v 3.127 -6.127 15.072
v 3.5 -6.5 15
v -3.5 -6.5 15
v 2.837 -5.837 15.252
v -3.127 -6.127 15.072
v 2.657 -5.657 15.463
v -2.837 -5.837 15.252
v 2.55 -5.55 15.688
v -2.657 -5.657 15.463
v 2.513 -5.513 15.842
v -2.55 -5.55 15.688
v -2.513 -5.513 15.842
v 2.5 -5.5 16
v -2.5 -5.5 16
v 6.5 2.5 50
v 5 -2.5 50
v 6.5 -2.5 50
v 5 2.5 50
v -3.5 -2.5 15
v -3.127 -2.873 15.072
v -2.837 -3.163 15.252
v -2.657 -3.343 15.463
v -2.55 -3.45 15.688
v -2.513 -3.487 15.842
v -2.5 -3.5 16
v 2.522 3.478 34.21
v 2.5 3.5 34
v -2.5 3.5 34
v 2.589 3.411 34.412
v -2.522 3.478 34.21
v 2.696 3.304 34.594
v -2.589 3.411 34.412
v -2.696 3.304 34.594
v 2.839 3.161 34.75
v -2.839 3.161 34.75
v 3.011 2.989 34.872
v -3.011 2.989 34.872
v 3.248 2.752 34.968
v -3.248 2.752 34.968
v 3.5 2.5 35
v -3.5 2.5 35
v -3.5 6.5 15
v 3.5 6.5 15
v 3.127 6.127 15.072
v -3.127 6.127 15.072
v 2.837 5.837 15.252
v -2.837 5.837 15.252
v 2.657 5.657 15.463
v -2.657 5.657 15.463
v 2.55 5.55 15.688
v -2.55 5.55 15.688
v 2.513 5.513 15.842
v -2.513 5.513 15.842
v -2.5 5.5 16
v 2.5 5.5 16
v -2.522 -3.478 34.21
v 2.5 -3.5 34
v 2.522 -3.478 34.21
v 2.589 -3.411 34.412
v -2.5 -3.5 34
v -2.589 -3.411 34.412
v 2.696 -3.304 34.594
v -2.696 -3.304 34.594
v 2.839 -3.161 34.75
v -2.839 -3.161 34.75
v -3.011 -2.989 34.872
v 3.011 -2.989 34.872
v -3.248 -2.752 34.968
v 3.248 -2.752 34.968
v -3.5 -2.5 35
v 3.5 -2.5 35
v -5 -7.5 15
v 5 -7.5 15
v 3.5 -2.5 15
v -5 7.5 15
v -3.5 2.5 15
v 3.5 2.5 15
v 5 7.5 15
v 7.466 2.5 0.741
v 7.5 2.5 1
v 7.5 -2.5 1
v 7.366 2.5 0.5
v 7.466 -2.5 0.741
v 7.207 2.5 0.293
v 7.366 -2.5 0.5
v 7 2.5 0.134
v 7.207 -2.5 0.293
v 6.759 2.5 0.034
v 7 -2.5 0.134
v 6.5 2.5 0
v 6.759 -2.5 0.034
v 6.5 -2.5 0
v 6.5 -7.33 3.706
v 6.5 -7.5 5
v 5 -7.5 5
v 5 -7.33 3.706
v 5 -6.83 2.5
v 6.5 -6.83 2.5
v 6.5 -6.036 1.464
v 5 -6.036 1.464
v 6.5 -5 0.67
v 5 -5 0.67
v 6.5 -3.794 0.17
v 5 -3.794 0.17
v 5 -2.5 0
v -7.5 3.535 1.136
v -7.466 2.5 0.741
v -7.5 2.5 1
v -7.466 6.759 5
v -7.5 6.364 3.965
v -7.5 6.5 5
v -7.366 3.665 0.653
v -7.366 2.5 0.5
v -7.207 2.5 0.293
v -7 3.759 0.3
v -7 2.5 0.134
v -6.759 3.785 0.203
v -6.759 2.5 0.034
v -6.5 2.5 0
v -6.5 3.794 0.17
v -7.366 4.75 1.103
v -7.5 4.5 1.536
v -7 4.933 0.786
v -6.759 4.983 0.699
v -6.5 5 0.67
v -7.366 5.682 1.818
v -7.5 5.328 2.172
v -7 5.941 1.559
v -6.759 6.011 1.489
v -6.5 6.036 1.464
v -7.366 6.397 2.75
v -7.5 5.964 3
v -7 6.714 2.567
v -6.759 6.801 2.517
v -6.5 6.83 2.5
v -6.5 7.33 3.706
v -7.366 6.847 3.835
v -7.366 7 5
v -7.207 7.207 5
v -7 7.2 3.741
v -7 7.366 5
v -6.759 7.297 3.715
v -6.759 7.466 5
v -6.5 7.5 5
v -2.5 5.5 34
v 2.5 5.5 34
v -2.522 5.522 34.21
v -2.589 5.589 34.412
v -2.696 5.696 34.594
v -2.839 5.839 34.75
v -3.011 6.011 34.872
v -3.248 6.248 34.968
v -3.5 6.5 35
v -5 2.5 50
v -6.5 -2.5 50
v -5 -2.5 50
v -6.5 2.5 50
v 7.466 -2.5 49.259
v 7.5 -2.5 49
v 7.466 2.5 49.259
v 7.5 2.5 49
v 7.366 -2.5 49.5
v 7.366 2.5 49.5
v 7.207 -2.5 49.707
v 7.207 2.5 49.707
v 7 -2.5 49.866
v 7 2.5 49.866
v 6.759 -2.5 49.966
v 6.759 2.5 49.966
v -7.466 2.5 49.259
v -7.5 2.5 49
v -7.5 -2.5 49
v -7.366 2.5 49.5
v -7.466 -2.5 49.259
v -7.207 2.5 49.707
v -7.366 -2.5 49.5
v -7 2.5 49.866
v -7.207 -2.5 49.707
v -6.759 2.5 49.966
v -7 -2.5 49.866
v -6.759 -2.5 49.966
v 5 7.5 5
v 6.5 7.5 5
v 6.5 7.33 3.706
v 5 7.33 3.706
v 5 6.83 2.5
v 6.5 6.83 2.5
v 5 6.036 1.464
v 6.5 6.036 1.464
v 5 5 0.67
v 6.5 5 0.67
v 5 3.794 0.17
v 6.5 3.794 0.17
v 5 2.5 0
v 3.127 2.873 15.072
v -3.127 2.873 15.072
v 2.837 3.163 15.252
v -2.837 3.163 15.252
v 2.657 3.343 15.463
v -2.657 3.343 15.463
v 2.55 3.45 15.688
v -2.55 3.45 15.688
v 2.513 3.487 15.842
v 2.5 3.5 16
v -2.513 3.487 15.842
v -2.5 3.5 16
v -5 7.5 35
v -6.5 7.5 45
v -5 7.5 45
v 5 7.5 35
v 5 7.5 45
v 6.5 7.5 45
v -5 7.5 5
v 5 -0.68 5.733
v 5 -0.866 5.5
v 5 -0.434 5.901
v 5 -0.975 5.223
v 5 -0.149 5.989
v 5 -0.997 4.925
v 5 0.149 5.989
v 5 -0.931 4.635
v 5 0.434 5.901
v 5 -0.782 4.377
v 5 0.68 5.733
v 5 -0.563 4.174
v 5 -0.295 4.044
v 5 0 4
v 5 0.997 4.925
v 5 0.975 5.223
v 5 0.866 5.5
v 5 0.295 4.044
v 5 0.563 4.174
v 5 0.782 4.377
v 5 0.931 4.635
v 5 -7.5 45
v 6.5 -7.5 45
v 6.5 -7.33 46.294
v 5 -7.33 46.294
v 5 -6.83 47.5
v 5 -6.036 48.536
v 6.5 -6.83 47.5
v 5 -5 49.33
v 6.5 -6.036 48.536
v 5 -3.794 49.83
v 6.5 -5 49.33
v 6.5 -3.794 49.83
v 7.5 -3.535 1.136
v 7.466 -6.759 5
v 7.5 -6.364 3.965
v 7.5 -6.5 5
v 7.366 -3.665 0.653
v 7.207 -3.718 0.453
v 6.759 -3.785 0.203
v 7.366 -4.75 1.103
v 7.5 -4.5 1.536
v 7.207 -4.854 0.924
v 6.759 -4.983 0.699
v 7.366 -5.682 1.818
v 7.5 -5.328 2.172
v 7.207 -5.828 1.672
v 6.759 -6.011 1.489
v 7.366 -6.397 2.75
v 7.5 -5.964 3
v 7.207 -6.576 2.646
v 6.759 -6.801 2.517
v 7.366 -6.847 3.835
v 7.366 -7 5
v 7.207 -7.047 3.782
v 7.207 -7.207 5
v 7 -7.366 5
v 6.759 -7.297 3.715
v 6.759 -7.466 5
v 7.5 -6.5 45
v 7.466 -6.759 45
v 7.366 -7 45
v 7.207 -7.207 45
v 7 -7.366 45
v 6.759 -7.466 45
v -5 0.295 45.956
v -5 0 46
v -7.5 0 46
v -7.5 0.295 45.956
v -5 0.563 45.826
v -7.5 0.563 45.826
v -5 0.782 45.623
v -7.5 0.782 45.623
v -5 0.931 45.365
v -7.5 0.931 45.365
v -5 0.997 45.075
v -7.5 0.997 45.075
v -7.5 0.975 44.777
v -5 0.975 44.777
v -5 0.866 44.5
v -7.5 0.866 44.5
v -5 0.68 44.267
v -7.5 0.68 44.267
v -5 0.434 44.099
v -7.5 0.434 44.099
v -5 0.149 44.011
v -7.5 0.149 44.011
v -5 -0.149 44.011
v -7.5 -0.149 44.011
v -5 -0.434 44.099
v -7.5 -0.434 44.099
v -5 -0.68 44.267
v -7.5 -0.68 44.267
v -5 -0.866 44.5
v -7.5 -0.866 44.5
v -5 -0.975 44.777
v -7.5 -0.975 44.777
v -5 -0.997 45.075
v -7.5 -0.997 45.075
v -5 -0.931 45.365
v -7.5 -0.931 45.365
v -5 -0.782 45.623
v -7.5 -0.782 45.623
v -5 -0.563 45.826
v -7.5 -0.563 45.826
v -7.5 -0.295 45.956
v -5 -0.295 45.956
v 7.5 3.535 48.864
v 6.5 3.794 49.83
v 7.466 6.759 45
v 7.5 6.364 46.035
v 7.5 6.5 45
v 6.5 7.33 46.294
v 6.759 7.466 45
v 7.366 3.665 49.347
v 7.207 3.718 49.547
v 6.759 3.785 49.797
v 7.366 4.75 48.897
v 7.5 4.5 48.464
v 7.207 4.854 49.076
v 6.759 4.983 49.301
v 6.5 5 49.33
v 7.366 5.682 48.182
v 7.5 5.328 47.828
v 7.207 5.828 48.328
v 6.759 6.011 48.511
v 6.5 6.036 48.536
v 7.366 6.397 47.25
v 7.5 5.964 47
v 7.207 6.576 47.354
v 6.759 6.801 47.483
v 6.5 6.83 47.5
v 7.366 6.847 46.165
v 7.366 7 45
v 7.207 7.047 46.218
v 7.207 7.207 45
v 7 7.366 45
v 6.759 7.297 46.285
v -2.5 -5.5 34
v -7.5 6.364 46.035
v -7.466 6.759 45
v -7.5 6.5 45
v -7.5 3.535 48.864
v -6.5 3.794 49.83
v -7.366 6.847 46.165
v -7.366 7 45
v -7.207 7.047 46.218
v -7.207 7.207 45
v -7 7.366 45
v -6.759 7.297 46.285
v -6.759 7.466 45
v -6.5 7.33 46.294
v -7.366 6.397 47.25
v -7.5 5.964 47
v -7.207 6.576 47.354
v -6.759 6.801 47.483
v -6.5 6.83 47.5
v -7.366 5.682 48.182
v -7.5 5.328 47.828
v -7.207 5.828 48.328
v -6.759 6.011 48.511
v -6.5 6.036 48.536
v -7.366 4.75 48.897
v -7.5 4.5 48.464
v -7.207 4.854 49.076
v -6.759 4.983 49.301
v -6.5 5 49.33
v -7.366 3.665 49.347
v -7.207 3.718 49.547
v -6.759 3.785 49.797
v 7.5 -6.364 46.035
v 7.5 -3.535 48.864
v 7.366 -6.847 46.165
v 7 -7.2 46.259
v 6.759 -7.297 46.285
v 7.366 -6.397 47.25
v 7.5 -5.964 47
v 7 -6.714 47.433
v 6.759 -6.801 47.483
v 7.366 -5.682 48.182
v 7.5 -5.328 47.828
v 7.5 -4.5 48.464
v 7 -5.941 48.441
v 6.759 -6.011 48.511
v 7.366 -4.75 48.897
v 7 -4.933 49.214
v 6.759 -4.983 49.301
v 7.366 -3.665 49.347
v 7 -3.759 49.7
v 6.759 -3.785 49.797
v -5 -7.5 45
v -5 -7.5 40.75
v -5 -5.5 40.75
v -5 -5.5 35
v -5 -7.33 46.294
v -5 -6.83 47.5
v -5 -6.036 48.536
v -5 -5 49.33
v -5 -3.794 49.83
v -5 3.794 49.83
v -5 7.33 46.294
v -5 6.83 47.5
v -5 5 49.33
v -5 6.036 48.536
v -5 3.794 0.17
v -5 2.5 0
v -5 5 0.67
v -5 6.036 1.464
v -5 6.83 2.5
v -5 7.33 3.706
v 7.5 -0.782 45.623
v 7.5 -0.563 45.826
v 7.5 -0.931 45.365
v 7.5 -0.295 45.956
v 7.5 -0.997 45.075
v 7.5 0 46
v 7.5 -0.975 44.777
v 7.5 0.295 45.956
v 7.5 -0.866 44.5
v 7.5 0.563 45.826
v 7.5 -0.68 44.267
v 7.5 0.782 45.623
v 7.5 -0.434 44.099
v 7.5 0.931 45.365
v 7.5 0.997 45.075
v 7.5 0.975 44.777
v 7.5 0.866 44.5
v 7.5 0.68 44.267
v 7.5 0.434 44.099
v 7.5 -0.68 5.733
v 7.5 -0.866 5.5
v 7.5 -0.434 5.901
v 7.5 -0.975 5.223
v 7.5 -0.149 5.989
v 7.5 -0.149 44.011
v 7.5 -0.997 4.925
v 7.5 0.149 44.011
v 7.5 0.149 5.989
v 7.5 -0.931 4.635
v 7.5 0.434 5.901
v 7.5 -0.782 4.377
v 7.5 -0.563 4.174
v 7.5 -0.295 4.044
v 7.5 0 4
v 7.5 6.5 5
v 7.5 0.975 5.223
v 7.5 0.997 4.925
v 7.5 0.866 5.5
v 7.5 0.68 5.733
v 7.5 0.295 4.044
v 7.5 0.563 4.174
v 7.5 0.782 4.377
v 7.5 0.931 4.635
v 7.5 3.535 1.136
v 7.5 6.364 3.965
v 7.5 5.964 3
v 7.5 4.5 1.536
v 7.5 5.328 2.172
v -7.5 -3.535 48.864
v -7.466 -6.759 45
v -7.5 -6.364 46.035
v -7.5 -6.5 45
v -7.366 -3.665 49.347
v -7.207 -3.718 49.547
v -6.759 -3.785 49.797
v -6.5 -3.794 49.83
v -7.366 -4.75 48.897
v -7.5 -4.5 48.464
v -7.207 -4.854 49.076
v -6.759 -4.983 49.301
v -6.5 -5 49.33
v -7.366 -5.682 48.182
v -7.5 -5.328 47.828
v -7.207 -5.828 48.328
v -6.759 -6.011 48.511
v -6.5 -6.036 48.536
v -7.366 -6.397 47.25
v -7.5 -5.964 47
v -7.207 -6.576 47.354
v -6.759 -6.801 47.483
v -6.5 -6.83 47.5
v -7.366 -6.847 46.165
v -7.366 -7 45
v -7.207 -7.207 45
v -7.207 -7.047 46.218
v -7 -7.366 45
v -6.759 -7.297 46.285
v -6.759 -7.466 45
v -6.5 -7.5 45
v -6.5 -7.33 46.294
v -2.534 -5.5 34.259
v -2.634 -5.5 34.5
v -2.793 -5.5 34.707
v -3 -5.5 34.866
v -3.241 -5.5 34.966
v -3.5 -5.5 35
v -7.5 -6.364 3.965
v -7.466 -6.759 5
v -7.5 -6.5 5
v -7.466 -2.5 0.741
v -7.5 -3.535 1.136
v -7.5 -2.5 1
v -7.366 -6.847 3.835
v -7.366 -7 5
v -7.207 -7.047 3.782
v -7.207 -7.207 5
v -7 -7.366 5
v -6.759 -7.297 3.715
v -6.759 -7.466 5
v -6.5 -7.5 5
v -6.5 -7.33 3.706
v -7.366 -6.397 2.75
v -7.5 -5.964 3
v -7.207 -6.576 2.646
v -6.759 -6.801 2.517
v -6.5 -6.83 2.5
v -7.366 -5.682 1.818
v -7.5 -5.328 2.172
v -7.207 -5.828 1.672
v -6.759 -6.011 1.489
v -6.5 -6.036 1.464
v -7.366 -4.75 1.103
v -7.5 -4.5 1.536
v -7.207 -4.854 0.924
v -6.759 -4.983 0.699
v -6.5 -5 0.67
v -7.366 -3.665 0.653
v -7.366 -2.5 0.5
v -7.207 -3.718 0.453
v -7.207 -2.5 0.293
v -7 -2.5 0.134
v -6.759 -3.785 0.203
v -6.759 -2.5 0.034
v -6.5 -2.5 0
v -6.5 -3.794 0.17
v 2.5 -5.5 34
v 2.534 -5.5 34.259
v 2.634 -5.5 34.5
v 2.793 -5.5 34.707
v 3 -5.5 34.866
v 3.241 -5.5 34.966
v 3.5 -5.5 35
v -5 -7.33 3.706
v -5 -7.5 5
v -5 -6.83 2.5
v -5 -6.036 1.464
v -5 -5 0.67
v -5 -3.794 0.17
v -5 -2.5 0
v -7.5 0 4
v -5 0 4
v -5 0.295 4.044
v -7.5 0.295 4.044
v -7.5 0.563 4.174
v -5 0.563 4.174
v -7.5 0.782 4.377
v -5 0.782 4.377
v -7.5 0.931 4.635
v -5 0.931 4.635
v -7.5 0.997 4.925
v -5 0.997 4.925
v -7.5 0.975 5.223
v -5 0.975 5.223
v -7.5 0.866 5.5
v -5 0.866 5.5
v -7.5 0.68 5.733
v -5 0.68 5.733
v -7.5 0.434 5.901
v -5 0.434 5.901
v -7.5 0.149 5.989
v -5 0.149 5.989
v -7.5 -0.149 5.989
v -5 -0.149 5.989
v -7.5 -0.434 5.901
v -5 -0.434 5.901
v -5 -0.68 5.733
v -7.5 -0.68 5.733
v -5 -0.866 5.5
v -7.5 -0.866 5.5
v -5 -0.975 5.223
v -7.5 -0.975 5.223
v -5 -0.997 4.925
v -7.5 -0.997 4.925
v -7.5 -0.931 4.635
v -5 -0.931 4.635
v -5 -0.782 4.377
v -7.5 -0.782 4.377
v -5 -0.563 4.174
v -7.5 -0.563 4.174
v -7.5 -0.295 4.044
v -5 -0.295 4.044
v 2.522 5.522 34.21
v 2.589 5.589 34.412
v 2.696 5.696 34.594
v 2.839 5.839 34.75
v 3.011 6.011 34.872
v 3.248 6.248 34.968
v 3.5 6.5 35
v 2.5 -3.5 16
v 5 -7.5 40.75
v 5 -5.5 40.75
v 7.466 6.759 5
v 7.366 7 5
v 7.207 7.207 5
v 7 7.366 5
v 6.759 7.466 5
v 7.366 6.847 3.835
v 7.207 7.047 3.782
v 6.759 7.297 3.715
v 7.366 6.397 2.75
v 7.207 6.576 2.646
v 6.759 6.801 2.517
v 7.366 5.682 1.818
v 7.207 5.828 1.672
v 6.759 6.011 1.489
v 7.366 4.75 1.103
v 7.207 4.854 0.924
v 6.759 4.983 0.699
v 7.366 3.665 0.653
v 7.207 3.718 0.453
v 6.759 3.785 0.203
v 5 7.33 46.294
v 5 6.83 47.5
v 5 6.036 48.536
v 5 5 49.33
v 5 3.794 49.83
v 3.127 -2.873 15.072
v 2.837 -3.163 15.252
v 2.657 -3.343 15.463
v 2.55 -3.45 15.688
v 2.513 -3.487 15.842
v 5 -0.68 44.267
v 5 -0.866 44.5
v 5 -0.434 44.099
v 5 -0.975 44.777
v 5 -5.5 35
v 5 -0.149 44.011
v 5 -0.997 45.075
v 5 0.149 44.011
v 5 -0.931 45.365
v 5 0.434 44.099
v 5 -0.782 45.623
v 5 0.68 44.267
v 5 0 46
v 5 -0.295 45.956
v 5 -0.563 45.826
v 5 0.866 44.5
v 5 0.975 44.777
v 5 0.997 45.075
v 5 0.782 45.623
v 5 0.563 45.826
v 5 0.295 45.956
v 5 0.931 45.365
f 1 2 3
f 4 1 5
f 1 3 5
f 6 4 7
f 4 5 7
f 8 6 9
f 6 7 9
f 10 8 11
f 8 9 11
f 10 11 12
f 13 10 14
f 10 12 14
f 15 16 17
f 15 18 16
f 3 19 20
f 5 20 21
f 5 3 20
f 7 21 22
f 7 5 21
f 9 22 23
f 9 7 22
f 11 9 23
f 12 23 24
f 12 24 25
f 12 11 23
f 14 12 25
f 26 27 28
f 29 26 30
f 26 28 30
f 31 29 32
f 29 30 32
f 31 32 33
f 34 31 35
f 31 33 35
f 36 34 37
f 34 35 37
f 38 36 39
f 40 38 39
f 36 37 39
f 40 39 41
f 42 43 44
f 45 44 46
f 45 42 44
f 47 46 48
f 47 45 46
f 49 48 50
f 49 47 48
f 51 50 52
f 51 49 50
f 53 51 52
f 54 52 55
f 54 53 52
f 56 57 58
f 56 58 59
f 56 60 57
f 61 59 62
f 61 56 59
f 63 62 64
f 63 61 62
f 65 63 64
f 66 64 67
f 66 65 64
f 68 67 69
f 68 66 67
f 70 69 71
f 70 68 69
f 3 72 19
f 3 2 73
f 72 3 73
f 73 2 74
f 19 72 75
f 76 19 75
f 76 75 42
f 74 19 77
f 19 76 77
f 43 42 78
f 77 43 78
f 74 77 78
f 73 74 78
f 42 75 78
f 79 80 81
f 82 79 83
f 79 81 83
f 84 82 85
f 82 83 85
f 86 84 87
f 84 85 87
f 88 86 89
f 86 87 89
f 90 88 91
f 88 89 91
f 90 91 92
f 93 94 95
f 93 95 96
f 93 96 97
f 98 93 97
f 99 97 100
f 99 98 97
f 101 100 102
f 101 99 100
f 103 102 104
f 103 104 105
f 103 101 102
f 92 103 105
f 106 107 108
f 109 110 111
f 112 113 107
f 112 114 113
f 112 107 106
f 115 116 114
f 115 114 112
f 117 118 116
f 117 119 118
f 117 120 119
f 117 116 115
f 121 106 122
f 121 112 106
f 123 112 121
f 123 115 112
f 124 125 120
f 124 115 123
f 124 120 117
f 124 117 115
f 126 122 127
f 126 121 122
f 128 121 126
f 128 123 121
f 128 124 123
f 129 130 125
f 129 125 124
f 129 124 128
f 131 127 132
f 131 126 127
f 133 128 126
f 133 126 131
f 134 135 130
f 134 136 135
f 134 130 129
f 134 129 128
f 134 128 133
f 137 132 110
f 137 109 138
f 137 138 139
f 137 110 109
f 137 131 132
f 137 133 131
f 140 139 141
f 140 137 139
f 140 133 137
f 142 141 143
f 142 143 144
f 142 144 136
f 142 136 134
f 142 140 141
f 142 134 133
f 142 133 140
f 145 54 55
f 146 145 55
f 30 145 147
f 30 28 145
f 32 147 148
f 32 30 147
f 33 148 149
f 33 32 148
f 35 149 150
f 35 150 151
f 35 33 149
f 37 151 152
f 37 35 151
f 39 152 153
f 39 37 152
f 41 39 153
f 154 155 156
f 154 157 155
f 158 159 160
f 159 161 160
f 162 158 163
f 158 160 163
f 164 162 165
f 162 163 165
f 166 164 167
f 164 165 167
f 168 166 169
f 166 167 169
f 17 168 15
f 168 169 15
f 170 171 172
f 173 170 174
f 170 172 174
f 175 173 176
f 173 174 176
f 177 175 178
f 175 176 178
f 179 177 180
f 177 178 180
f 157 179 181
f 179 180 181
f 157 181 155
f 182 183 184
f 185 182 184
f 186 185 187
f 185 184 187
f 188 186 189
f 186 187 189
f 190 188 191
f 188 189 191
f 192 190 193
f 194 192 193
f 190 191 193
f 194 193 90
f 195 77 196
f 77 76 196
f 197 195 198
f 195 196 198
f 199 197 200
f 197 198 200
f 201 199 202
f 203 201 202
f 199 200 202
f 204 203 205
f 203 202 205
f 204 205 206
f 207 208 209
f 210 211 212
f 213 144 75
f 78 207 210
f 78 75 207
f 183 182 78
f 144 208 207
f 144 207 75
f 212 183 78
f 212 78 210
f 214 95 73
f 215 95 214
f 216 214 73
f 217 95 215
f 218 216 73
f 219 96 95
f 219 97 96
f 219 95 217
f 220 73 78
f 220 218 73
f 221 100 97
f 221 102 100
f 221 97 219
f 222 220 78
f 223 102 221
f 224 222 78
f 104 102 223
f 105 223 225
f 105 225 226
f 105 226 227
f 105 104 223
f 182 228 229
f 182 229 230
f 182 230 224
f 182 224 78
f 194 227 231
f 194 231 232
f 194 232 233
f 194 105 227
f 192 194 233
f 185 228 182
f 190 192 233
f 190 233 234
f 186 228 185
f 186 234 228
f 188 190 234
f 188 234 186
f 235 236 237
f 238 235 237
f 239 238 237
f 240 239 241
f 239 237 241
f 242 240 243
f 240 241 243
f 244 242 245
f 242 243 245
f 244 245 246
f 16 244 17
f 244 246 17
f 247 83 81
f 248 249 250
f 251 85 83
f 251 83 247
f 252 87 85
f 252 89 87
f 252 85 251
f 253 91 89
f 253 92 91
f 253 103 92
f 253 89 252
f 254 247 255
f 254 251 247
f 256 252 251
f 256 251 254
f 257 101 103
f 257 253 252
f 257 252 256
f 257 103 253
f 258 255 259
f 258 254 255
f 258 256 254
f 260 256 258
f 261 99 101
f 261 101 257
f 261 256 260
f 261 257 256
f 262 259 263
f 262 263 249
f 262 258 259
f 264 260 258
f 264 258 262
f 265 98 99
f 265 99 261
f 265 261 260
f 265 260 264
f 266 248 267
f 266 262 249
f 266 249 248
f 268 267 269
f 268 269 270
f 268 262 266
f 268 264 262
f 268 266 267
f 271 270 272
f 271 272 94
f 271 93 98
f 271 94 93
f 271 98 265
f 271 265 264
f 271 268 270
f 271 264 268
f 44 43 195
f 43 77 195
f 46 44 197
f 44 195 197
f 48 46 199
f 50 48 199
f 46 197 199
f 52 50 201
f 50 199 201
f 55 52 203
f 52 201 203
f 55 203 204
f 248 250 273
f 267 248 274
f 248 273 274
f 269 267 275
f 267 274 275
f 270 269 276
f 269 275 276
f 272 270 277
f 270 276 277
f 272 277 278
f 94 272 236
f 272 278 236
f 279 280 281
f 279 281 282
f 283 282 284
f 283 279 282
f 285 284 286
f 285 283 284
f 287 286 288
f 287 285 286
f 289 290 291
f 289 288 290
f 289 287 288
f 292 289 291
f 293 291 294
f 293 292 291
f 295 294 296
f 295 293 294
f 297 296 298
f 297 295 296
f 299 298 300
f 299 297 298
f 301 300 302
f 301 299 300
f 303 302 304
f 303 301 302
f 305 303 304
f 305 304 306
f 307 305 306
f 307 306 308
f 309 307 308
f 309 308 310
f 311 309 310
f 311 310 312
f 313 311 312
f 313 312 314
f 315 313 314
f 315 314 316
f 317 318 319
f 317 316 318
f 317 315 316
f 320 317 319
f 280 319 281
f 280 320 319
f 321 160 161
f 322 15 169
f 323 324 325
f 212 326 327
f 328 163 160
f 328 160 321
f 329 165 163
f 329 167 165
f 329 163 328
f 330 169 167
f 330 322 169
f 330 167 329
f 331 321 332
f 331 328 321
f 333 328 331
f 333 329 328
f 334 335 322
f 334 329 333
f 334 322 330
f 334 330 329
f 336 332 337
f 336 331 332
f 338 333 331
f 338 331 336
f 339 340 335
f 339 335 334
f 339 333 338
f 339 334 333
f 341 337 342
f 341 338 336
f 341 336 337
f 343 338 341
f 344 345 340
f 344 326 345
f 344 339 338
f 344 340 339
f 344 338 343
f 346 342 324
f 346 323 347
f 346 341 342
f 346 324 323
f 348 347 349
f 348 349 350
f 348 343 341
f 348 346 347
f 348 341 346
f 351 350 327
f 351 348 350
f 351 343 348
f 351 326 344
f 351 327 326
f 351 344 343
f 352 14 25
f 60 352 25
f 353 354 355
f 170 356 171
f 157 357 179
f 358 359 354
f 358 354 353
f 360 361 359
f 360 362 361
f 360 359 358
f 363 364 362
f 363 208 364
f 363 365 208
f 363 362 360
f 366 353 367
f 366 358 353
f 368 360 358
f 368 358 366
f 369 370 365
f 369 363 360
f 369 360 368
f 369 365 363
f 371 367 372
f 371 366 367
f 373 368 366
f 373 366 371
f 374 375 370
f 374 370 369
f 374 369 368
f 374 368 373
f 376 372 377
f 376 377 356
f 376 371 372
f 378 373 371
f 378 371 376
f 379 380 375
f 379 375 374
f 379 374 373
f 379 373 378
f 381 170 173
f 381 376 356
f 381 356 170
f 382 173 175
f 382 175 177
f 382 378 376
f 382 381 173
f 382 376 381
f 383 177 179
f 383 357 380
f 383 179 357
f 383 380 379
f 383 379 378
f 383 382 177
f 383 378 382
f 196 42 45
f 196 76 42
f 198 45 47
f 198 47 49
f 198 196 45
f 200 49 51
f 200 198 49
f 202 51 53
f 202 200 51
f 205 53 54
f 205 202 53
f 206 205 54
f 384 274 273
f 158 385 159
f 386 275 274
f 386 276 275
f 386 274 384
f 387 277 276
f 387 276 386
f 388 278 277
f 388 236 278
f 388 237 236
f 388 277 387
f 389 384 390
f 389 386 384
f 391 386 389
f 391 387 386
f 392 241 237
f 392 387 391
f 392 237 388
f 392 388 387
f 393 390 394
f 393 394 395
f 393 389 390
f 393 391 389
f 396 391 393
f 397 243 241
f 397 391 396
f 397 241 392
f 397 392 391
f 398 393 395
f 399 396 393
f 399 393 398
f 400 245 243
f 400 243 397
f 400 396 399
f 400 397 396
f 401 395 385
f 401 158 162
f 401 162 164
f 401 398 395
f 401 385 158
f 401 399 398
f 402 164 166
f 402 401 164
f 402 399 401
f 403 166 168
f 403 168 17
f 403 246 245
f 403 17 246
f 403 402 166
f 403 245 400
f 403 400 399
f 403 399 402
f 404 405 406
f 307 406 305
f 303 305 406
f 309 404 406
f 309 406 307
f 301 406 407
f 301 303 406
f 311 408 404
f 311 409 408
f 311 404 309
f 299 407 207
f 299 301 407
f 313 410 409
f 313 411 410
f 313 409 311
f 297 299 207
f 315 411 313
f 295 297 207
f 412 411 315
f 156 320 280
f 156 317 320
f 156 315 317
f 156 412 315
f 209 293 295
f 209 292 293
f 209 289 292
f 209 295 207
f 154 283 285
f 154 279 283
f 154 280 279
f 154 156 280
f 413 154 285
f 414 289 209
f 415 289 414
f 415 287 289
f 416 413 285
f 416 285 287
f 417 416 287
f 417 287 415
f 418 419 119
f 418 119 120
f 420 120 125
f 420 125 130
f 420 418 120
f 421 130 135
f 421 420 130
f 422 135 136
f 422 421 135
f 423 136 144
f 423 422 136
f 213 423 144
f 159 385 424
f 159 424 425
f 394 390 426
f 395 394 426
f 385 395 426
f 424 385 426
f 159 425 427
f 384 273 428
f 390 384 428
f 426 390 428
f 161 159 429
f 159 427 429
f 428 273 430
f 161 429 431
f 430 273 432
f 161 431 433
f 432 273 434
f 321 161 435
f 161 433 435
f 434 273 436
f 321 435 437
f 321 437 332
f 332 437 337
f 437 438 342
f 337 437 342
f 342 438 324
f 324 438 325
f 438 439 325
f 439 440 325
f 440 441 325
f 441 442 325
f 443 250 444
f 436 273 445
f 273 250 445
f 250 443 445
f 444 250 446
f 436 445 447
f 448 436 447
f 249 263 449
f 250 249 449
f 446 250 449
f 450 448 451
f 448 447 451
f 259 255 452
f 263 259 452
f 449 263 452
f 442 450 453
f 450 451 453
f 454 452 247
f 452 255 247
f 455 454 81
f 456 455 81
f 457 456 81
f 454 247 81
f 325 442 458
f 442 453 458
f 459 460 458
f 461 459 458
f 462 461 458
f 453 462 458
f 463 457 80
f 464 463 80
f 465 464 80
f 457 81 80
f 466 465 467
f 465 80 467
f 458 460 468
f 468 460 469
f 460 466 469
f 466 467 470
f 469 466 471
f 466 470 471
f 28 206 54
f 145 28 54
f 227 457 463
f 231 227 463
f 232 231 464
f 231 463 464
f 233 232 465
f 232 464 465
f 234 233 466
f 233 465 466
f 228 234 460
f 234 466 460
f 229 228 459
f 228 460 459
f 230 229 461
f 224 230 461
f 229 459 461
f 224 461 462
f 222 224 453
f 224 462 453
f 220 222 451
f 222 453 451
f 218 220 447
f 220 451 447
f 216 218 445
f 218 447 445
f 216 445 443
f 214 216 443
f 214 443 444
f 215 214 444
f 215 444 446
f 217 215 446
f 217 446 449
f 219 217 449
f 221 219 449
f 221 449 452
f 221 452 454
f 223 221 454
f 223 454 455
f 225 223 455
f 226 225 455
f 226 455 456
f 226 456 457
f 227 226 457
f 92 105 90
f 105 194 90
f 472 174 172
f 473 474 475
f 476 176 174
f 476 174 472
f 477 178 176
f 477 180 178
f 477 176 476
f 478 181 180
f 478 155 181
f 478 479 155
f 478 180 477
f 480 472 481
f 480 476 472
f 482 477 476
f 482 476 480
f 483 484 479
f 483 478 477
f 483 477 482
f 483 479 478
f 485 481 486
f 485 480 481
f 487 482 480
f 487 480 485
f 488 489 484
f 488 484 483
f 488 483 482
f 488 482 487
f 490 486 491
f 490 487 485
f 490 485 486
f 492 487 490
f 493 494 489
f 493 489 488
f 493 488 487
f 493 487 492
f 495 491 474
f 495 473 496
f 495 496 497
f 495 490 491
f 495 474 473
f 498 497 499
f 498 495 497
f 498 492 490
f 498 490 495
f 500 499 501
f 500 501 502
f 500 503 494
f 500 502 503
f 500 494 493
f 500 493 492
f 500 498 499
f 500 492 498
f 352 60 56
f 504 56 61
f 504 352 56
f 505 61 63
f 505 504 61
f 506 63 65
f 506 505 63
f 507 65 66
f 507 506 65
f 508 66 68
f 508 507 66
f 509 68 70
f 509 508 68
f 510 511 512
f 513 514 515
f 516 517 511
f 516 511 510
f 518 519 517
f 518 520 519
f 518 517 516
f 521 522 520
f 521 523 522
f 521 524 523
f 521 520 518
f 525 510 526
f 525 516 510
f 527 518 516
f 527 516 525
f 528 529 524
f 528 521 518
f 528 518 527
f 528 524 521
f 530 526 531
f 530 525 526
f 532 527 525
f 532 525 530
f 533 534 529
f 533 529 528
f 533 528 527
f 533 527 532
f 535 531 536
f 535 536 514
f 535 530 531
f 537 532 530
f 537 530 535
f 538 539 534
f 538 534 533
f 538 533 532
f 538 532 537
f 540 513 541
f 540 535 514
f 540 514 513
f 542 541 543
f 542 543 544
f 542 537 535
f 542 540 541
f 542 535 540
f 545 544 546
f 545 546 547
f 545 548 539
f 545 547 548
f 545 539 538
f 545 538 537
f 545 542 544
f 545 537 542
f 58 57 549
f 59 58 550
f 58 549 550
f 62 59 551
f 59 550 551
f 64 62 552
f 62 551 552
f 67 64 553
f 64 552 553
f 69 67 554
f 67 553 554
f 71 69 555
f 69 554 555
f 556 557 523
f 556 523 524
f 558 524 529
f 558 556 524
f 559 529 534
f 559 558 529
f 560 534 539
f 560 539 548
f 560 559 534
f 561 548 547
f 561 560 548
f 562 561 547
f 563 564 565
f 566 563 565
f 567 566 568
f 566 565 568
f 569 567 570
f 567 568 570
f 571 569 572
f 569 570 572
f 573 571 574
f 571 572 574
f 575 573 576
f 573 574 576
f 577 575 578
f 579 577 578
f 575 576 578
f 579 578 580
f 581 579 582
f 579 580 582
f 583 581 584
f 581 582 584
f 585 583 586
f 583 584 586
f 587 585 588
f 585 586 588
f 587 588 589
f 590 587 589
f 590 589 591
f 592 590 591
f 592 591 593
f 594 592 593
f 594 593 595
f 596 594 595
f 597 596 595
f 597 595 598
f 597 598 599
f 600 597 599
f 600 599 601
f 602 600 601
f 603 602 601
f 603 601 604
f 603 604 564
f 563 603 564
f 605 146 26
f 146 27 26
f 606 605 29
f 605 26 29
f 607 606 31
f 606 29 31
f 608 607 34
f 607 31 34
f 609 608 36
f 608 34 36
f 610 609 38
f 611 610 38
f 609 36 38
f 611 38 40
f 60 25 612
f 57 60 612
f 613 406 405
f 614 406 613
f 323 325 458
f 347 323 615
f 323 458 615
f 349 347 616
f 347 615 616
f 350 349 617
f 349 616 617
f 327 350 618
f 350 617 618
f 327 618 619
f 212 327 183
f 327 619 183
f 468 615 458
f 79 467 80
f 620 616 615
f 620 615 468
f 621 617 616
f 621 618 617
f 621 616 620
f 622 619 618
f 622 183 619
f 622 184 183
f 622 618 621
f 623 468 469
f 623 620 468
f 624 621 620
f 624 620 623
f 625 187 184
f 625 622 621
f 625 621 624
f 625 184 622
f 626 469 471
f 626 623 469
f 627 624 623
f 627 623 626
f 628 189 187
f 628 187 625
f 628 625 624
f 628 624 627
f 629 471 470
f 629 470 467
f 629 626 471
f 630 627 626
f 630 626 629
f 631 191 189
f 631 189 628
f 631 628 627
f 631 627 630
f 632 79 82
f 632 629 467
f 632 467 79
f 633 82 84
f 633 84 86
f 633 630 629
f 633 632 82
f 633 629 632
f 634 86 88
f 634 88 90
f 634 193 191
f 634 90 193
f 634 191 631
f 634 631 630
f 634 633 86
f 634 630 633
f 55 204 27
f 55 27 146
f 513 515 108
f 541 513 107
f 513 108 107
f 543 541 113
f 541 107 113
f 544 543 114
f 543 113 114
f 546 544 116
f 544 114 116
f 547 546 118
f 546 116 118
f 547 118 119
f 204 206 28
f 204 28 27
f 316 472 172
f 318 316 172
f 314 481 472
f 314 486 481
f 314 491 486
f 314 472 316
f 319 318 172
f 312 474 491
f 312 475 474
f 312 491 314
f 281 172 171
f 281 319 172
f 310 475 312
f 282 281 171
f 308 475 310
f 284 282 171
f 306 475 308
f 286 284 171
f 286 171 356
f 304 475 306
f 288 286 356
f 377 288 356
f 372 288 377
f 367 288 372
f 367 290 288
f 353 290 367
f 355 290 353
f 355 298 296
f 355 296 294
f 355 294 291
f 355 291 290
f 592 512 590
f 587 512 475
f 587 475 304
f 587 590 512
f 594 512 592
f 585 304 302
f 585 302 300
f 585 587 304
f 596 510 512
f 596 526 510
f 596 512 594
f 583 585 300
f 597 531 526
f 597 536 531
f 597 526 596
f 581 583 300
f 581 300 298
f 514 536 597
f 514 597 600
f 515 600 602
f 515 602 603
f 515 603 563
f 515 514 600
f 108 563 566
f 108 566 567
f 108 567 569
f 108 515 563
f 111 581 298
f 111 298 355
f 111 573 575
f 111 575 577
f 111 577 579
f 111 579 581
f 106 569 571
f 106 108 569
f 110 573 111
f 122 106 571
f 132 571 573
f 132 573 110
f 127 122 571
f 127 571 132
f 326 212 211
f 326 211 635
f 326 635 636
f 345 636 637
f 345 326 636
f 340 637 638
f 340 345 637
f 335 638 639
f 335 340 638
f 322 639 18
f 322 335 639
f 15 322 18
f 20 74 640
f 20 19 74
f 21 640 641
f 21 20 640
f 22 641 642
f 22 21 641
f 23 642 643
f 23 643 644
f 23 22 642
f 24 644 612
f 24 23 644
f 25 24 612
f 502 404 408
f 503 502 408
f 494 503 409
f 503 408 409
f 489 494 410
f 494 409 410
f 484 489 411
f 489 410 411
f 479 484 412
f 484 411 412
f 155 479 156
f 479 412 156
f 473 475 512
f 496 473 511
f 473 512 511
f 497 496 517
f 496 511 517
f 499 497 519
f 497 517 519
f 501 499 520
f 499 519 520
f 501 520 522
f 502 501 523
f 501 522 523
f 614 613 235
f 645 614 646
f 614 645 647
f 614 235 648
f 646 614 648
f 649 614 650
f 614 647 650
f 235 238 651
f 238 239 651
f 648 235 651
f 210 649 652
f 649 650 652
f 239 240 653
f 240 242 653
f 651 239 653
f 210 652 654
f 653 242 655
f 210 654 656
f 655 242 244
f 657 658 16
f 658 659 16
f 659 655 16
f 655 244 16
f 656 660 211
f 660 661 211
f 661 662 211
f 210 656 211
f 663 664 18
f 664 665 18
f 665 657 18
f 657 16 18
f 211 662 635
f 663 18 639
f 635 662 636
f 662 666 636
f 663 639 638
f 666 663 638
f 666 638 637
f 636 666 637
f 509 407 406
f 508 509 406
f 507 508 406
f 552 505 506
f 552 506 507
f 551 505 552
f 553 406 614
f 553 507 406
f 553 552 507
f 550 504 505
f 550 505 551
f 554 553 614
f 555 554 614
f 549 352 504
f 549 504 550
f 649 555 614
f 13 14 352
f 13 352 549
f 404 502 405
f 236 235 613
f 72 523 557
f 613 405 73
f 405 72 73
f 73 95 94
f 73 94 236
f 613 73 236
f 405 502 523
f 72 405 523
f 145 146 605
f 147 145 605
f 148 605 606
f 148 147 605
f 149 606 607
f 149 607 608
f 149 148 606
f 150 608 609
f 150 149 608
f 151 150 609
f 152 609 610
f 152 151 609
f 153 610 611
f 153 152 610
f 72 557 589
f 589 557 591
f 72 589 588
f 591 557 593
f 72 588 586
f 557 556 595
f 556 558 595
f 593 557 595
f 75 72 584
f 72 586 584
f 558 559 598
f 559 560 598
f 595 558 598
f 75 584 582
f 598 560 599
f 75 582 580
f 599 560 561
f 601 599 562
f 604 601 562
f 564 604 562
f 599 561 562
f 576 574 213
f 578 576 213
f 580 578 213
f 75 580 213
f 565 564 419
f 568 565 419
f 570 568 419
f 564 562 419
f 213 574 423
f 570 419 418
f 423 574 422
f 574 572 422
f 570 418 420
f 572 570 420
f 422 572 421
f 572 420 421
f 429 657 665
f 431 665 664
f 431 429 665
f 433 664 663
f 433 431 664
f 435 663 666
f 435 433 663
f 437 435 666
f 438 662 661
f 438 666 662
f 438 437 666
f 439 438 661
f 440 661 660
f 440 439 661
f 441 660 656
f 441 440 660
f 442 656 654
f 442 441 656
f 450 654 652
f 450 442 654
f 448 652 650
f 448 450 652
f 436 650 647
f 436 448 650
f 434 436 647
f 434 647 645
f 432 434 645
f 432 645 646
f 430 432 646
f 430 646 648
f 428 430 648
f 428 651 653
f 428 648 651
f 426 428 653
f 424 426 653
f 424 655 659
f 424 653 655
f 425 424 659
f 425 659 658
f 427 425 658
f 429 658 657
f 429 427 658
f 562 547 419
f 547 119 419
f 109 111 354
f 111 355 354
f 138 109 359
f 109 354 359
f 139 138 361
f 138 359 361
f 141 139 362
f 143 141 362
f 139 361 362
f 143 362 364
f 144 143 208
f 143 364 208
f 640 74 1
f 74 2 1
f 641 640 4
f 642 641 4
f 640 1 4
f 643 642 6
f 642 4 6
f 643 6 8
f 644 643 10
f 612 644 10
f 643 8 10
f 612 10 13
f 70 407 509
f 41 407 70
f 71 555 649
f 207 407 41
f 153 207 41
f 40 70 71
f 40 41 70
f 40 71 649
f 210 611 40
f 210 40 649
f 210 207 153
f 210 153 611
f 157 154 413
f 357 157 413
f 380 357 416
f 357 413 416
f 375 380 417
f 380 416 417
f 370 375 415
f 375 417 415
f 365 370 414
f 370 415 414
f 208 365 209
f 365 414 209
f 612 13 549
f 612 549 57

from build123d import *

# Parameters (mm, degrees)
BOTTOM_SECTION_BASE_SKETCH_W     = 15
BOTTOM_SECTION_BASE_SKETCH_H     = 15
BOTTOM_SECTION_EXTRUDE_DEPTH     = 50
HINGE_CUTOUT_SKETCH_W            = 10
HINGE_CUTOUT_SKETCH_H            = 15
HINGE_CUTOUT_EXTRUDED_CUT_DEPTH  = 15
HINGE_HOLE_SKETCH_R              = 1
HINGE_HOLE_EXTRUDED_CUT_DEPTH    = 53.737557774
HINGER_CORNER_FILLETS_R          = 5
STYLE_FILLETS_R                  = 1
ROUTING_HOLES_SKETCH_W           = 5
ROUTING_HOLES_SKETCH_H           = 2
ROUTING_HOLES_EXTRUDED_CUT_DEPTH = 52.112620751
BACKING_SKETCH_W                 = 10
BACKING_SKETCH_H                 = 2
BACKING_EXTRUDE_DEPTH            = 5.75
ROUTING_FILLETS_R                = 1


with BuildPart() as part:
    # Bottom Section Base Sketch → Bottom Section Extrude (new body)
    with BuildSketch(Plane.XY):
        Rectangle(BOTTOM_SECTION_BASE_SKETCH_W, BOTTOM_SECTION_BASE_SKETCH_H)
    extrude(amount=BOTTOM_SECTION_EXTRUDE_DEPTH)

    # Hinge Cutout Sketch → Hinge Cutout Extruded Cut (cut)
    with BuildSketch(Plane.XY):
        Rectangle(HINGE_CUTOUT_SKETCH_W, HINGE_CUTOUT_SKETCH_H)
    hinge_cutout_extruded_cut = extrude(amount=HINGE_CUTOUT_EXTRUDED_CUT_DEPTH, mode=Mode.SUBTRACT)

    # Hinge Hole Sketch → Hinge Hole Extruded Cut (cut, through all)
    with BuildSketch(Plane(origin=(7.5, 0, 0), x_dir=(0, 0, -1), z_dir=(1, 0, 0))):
        with Locations((-5, 0)):
            Circle(HINGE_HOLE_SKETCH_R)
    hinge_hole_extruded_cut = extrude(amount=-HINGE_HOLE_EXTRUDED_CUT_DEPTH, mode=Mode.SUBTRACT)

    # Hinge and Hole Cutout Mirror: Hinge Cutout Extruded Cut, Hinge Hole Extruded Cut across plane
    add(hinge_cutout_extruded_cut.mirror(Plane.XY.offset(25)), mode=Mode.SUBTRACT)
    add(hinge_hole_extruded_cut.mirror(Plane.XY.offset(25)), mode=Mode.SUBTRACT)

    # Hinger Corner Fillets
    hinger_corner_fillets_edges = [part.edges().sort_by_distance(p)[0] for p in [
        (6.25, -7.5, 0),
        (-6.25, 7.5, 0),
        (-6.25, -7.5, 50),
        (-6.25, 7.5, 50),
        (6.25, -7.5, 50),
        (-6.25, -7.5, 0),
        (6.25, 7.5, 0),
        (6.25, 7.5, 50),
    ]]
    fillet(hinger_corner_fillets_edges, radius=HINGER_CORNER_FILLETS_R)

    # Style Fillets
    style_fillets_edges = [part.edges().sort_by_distance(p)[0] for p in [
        (7.5, 0, 50),
        (7.5, 7.5, 25),
        (-7.5, 7.5, 25),
        (7.5, 0, 0),
        (7.5, -7.5, 25),
        (7.5, 6.035533906, 1.464466094),
        (7.5, -6.035533906, 1.464466094),
        (7.5, -6.035533906, 48.535533906),
        (7.5, 6.035533906, 48.535533906),
        (-7.5, -7.5, 25),
        (-7.5, 0, 50),
        (-7.5, 0, 0),
        (-7.5, -6.035533906, 1.464466094),
        (-7.5, 6.035533906, 1.464466094),
        (-7.5, 6.035533906, 48.535533906),
        (-7.5, -6.035533906, 48.535533906),
    ]]
    fillet(style_fillets_edges, radius=STYLE_FILLETS_R)

    # Routing Holes Sketch → Routing Holes Extruded Cut (cut, through all)
    with BuildSketch(Plane.XY):
        with Locations((0, 4.5)):
            Rectangle(ROUTING_HOLES_SKETCH_W, ROUTING_HOLES_SKETCH_H)
        with Locations((0, -4.5)):
            Rectangle(ROUTING_HOLES_SKETCH_W, ROUTING_HOLES_SKETCH_H)
    extrude(amount=ROUTING_HOLES_EXTRUDED_CUT_DEPTH, mode=Mode.SUBTRACT)

    # Backing Sketch → Backing Extrude (add)
    with BuildSketch(Plane.XY.offset(35)):
        with Locations((0, -6.5)):
            Rectangle(BACKING_SKETCH_W, BACKING_SKETCH_H)
    extrude(amount=BACKING_EXTRUDE_DEPTH)

    # Routing Fillets
    routing_fillets_edges = [part.edges().sort_by_distance(p)[0] for p in [
        (-2.5, -4.5, 35),
        (0, -3.5, 35),
        (2.5, -4.5, 35),
        (0, 5.5, 35),
        (2.5, 4.5, 35),
        (0, 3.5, 35),
        (-2.5, 4.5, 35),
        (-2.5, 4.5, 15),
        (0, 3.5, 15),
        (2.5, 4.5, 15),
        (0, 5.5, 15),
        (0, -5.5, 15),
        (2.5, -4.5, 15),
        (0, -3.5, 15),
        (-2.5, -4.5, 15),
    ]]
    fillet(routing_fillets_edges, radius=ROUTING_FILLETS_R)


solid = part.part
